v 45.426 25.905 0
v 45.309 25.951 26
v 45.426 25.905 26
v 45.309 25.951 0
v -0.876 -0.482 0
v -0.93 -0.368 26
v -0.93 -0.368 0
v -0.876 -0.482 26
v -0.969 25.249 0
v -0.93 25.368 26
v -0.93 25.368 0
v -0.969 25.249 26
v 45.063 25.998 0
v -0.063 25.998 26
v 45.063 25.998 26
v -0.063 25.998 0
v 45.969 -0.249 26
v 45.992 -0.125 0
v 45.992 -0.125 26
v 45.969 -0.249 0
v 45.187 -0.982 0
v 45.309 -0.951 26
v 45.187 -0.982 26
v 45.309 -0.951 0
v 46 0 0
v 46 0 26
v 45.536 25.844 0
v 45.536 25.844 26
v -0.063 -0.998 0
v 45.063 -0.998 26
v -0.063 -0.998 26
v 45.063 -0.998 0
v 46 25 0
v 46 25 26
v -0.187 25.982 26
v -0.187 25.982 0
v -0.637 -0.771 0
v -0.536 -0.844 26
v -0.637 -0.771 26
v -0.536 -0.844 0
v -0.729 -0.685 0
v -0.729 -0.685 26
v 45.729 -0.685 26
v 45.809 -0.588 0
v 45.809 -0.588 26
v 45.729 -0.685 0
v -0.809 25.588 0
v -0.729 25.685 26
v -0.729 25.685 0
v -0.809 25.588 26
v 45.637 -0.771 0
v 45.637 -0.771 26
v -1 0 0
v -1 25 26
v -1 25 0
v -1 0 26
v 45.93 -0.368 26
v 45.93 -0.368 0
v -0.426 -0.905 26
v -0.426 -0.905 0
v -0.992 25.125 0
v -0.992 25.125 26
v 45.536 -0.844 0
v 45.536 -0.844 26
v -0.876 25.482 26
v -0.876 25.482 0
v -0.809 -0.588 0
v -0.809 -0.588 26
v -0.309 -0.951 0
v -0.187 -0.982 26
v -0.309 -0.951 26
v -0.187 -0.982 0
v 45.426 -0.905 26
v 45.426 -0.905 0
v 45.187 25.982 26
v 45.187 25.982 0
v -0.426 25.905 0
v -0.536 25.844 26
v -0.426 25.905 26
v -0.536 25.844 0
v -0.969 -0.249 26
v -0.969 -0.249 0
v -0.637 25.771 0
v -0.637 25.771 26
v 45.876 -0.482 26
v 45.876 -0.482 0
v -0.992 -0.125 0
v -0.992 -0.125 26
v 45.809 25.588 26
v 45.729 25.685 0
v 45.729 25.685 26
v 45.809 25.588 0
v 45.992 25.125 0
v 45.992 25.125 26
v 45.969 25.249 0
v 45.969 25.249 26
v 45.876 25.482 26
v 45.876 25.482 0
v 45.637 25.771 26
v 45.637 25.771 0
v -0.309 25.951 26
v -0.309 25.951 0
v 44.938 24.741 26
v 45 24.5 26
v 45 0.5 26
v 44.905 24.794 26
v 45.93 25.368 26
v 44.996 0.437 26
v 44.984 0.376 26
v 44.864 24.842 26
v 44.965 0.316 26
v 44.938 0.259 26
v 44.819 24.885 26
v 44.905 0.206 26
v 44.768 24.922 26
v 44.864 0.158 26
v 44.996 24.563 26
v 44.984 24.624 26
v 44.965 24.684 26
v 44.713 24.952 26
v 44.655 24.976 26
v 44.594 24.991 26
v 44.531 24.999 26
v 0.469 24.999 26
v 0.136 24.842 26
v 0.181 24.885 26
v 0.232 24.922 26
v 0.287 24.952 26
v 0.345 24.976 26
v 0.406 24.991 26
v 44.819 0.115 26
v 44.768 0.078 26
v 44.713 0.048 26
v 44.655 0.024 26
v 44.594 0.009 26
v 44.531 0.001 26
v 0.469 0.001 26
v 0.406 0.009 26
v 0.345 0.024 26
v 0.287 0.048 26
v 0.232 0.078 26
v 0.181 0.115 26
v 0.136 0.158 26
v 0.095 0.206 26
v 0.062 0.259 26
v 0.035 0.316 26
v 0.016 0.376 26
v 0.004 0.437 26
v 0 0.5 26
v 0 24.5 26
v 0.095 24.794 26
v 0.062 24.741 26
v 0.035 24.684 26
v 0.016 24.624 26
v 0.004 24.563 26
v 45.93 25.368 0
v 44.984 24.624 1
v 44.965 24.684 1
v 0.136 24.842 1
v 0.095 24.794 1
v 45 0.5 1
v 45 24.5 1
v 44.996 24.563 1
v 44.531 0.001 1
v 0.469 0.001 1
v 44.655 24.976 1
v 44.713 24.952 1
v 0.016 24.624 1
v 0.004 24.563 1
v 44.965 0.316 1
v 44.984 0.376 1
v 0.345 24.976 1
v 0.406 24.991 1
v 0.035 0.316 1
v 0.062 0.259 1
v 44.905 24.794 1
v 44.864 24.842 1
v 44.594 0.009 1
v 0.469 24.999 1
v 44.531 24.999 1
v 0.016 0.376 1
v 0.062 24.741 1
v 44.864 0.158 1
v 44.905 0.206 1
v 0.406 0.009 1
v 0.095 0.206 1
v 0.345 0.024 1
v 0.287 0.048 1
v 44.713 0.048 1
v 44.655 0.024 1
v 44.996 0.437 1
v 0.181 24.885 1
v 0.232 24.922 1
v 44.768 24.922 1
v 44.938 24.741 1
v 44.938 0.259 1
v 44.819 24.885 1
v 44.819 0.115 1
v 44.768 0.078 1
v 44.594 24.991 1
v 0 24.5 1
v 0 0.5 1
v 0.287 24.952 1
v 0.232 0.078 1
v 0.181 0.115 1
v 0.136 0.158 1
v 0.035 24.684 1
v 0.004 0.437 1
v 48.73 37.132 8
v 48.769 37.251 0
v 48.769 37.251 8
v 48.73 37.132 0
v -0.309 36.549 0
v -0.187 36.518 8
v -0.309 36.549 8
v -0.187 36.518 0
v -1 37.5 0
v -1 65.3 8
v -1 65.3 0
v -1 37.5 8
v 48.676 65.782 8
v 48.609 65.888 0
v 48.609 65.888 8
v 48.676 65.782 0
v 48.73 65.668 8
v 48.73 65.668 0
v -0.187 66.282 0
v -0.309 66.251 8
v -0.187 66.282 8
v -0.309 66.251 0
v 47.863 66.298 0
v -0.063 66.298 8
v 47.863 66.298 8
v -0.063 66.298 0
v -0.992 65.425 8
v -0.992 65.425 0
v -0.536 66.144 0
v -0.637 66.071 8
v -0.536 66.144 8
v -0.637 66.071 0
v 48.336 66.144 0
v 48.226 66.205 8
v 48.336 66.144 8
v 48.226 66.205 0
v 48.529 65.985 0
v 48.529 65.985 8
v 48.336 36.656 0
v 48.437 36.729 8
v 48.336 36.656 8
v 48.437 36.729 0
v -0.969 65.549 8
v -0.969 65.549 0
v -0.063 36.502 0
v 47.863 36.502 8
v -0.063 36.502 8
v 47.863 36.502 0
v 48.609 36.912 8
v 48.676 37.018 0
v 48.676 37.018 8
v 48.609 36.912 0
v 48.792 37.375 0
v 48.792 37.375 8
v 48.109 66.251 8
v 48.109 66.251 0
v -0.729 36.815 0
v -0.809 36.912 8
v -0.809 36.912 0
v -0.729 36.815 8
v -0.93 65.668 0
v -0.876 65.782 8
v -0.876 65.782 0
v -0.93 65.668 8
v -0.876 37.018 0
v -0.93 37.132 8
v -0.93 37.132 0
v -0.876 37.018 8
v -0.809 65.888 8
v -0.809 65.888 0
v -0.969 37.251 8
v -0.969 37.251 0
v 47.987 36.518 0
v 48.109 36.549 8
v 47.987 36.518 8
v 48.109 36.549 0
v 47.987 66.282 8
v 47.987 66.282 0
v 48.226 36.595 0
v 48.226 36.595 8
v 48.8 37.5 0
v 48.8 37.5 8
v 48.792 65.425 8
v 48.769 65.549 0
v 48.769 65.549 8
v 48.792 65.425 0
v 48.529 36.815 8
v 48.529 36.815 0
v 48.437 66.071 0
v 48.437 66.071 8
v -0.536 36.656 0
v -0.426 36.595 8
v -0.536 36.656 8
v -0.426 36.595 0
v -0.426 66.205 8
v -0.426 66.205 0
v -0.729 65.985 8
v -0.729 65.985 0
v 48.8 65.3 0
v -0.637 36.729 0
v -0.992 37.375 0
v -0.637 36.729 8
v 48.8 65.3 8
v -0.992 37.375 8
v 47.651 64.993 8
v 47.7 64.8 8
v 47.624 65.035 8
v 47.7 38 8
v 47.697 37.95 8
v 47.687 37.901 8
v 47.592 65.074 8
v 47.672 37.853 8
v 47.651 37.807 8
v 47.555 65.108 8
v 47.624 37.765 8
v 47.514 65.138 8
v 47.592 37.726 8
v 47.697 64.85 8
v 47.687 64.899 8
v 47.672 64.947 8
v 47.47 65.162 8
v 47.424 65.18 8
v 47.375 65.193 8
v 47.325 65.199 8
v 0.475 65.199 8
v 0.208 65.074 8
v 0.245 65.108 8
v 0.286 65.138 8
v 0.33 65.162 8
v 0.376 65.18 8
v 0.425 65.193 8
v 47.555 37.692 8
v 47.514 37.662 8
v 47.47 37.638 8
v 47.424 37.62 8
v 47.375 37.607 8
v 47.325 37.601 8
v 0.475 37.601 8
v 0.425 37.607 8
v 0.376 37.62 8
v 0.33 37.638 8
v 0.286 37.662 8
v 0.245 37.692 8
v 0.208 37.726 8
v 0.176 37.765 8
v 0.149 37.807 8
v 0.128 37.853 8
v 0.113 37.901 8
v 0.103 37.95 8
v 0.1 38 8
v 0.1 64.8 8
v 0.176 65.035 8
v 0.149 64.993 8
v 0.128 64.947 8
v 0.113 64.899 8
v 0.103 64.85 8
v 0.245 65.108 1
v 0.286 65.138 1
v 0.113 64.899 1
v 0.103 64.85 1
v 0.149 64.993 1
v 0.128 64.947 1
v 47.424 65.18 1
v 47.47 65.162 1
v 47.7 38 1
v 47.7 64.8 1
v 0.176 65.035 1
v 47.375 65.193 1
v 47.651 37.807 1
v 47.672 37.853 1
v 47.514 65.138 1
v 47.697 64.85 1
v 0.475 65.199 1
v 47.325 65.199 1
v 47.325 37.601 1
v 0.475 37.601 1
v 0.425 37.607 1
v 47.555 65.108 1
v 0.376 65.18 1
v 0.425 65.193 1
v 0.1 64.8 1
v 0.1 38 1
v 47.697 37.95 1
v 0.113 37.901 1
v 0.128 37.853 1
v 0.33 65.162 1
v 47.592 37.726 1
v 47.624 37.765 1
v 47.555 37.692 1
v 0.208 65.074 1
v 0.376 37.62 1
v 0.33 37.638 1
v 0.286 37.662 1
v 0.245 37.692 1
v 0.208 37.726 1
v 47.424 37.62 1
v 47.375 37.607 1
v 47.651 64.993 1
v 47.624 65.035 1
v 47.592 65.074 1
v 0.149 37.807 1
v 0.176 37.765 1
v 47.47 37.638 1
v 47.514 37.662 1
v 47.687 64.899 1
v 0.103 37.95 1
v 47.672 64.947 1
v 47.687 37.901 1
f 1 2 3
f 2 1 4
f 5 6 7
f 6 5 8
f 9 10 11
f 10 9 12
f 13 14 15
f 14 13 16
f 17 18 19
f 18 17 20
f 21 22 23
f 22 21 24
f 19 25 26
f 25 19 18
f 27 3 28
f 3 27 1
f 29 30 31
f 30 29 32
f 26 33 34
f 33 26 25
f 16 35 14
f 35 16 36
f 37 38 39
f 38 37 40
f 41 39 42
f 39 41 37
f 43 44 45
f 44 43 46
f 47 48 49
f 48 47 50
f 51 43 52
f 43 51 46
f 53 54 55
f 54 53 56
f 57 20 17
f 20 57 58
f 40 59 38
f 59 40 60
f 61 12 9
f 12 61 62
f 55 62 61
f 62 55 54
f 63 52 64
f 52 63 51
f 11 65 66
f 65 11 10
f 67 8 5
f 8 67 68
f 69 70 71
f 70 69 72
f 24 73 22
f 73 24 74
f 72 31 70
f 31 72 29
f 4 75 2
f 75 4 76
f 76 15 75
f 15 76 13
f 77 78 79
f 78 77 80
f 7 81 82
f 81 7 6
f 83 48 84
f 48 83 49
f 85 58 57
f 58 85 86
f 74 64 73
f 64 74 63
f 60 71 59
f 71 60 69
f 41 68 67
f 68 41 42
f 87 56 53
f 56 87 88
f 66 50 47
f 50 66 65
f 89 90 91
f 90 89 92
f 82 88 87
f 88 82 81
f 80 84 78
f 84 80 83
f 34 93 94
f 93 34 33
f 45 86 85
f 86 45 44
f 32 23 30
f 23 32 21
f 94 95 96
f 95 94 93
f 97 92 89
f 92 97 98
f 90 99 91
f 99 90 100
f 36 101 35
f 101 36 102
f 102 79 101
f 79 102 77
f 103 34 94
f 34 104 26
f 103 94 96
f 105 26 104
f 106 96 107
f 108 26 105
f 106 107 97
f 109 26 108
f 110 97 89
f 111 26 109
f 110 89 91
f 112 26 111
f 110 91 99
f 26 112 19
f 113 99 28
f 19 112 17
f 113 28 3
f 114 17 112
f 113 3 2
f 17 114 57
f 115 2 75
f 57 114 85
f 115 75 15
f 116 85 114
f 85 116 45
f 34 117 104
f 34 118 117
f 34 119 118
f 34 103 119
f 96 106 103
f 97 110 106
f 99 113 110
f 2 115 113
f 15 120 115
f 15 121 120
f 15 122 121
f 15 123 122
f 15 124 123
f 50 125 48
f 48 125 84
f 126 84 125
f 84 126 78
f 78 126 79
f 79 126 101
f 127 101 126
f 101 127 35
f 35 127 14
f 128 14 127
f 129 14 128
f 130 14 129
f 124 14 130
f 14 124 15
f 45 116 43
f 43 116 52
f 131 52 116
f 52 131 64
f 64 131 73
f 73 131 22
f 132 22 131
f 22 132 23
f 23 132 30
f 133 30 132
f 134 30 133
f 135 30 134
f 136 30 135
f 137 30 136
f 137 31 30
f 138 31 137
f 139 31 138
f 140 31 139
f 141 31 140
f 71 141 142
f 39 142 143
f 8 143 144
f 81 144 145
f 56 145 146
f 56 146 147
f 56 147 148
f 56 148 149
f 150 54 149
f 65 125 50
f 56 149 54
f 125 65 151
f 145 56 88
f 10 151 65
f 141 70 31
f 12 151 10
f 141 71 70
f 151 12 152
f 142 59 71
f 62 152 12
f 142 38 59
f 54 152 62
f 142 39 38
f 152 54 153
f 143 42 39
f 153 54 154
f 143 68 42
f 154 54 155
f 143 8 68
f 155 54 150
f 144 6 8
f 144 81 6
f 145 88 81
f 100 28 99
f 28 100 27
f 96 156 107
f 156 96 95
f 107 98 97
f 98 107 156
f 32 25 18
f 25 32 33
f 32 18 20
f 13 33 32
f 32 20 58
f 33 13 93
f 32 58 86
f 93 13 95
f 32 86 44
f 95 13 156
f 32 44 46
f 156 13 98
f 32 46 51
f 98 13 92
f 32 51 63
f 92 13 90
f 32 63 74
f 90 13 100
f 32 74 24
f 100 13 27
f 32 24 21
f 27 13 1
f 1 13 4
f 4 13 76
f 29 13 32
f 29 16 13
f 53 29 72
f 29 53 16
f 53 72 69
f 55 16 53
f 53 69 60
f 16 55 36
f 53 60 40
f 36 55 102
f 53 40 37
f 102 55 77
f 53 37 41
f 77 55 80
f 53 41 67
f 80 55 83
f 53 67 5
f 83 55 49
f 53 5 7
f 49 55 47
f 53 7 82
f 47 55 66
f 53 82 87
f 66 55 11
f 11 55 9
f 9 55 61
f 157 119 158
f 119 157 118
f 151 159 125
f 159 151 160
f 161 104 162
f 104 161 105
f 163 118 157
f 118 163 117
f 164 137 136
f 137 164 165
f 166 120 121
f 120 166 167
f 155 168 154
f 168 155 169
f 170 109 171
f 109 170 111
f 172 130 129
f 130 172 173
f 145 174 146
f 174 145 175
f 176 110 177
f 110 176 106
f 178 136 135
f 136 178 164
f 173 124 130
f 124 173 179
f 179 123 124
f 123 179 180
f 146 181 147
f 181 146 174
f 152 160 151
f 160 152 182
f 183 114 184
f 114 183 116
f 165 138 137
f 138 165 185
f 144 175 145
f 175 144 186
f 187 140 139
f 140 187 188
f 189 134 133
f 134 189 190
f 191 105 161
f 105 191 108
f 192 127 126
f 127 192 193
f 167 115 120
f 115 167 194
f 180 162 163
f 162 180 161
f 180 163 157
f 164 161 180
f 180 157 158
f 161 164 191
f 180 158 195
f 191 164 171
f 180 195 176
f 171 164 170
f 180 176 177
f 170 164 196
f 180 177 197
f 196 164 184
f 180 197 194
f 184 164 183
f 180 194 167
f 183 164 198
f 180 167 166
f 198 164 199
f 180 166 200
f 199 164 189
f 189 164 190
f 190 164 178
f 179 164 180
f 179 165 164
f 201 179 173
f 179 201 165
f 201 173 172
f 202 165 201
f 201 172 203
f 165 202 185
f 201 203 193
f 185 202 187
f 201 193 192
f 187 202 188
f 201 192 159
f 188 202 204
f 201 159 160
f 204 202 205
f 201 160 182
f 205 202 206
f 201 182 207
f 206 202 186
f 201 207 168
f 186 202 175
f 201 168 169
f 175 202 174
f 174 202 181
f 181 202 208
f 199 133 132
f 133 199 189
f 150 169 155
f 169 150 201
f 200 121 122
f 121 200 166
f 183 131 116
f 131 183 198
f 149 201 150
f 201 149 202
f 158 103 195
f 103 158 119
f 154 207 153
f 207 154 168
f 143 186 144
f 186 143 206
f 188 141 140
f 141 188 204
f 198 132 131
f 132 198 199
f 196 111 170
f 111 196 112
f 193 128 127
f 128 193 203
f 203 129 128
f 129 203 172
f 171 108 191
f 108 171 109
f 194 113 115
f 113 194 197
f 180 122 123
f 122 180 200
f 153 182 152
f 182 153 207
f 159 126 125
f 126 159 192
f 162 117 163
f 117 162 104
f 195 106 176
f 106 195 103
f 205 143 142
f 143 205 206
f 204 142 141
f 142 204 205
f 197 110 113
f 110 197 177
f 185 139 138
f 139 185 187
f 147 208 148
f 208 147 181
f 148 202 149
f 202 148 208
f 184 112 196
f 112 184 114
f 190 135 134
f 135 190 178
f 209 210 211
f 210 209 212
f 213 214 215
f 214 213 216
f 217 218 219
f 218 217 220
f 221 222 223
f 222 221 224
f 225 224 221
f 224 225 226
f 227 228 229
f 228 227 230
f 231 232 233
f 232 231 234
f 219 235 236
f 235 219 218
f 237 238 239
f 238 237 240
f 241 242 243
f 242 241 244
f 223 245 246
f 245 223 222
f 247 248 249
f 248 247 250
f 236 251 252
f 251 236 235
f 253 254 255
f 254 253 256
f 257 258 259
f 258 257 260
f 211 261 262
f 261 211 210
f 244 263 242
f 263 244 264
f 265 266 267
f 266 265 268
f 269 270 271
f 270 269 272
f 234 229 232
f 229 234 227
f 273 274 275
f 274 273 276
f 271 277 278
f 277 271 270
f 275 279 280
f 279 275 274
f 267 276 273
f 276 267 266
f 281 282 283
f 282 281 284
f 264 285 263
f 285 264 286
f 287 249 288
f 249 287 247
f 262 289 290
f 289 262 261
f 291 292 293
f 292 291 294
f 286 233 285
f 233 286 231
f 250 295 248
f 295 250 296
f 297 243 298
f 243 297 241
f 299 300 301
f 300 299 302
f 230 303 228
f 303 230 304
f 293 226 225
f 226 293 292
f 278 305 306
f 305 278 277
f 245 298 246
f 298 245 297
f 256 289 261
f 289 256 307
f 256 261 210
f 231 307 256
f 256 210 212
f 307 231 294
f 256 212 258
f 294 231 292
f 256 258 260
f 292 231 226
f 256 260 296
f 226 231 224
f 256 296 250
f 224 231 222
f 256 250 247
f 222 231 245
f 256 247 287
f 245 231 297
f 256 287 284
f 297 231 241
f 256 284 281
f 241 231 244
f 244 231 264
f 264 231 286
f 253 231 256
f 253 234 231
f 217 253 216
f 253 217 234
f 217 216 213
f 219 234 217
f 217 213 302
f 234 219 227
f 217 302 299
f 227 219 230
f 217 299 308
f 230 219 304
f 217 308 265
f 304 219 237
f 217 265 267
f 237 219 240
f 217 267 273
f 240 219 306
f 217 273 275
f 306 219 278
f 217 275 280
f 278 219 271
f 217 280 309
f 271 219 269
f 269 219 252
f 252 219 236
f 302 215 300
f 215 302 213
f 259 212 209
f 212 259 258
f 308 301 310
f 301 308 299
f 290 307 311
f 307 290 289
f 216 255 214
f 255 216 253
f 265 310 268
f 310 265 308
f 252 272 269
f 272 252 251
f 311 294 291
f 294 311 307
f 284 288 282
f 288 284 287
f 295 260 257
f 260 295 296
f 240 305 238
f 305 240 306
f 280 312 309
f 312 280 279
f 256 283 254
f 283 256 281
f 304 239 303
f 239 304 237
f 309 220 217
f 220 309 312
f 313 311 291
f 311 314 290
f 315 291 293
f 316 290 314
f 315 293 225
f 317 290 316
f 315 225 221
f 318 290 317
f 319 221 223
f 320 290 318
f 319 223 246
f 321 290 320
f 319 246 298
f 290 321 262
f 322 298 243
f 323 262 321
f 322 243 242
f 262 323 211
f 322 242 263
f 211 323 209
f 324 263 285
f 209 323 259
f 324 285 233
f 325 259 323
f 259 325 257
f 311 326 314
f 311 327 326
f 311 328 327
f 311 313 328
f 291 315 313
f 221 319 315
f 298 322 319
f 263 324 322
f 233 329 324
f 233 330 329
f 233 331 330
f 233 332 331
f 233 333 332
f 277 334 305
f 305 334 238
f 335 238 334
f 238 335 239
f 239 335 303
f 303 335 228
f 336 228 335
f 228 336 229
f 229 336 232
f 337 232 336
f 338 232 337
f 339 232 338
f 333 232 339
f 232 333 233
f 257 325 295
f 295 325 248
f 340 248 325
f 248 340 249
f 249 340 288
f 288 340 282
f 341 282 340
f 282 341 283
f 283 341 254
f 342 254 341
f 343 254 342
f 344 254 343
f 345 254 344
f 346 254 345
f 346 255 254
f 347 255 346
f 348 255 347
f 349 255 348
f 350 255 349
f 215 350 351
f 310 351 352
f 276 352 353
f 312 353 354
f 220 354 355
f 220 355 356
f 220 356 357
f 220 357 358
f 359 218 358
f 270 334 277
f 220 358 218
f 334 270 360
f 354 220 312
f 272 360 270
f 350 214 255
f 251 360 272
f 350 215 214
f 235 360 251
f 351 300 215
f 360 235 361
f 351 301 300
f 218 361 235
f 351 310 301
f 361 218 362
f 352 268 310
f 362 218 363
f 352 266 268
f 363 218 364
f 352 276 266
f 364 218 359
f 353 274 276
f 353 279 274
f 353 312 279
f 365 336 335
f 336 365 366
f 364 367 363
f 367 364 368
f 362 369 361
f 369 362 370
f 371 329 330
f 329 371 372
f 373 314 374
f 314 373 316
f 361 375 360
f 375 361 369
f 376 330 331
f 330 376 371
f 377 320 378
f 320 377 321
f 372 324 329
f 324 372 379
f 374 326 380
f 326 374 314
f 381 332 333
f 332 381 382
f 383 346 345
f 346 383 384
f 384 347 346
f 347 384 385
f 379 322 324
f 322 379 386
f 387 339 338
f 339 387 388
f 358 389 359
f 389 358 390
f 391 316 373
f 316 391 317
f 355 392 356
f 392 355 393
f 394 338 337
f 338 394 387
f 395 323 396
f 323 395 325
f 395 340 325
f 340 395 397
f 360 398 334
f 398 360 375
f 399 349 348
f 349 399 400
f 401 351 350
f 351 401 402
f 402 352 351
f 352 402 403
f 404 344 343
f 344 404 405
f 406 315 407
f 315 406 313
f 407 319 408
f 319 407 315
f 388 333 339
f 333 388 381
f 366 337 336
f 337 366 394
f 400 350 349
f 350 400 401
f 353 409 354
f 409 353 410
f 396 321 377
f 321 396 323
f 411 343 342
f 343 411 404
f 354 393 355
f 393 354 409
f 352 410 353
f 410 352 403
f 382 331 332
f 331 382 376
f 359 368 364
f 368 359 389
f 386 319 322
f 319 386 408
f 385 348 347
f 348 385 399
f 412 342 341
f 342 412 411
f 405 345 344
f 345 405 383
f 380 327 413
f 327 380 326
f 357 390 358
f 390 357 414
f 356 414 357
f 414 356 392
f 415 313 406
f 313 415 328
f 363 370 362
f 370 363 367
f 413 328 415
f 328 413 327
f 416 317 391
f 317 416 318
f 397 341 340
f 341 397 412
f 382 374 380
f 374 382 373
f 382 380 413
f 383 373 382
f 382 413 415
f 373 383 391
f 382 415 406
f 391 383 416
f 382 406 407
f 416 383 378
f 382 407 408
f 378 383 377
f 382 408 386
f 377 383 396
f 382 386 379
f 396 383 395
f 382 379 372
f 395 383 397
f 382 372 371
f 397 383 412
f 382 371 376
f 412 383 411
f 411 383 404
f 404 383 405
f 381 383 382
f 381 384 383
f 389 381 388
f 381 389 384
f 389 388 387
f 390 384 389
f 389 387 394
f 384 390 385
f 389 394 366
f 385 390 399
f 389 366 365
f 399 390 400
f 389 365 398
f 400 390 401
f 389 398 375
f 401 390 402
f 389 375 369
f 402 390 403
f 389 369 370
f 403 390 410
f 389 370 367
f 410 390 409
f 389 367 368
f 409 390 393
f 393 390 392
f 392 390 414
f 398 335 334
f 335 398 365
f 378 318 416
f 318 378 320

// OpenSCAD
/* [ Mini Rounded Box v.1 ]
written by: Hermes Alvarado <hermesalvarado@gmail.com
*/
//Define dimensions:
$fn=50; //resolution
thickness = 1;
bottomthickness = 1;
tolerance = 0.4;
width = 45;
length = 25;
height = 25;
lidheight = 7;

//Make box:
difference(){
    minkowski(){
        cube([width,length,height]);
        cylinder(r=1,h=1);
        }
        translate([thickness/2,thickness/2,bottomthickness]){
            minkowski(){
                cube([width-thickness,length-thickness,height]);
                cylinder(r=1-thickness/2,h=1);
            }
        }
    }
//Make lid:
    translate([0,length*1.5,0]){    
    difference(){
        minkowski(){
            cube([width+thickness*2+tolerance*2,length+thickness*2+tolerance*2,lidheight]);
            cylinder(r=1,h=1);
        }
        translate([thickness/2,thickness/2,bottomthickness]){
            minkowski(){
                cube([width+tolerance*2+thickness,length+tolerance*2+thickness,lidheight]);
                cylinder(r=1+tolerance-thickness,h=1);
            }
        }
    }
}
